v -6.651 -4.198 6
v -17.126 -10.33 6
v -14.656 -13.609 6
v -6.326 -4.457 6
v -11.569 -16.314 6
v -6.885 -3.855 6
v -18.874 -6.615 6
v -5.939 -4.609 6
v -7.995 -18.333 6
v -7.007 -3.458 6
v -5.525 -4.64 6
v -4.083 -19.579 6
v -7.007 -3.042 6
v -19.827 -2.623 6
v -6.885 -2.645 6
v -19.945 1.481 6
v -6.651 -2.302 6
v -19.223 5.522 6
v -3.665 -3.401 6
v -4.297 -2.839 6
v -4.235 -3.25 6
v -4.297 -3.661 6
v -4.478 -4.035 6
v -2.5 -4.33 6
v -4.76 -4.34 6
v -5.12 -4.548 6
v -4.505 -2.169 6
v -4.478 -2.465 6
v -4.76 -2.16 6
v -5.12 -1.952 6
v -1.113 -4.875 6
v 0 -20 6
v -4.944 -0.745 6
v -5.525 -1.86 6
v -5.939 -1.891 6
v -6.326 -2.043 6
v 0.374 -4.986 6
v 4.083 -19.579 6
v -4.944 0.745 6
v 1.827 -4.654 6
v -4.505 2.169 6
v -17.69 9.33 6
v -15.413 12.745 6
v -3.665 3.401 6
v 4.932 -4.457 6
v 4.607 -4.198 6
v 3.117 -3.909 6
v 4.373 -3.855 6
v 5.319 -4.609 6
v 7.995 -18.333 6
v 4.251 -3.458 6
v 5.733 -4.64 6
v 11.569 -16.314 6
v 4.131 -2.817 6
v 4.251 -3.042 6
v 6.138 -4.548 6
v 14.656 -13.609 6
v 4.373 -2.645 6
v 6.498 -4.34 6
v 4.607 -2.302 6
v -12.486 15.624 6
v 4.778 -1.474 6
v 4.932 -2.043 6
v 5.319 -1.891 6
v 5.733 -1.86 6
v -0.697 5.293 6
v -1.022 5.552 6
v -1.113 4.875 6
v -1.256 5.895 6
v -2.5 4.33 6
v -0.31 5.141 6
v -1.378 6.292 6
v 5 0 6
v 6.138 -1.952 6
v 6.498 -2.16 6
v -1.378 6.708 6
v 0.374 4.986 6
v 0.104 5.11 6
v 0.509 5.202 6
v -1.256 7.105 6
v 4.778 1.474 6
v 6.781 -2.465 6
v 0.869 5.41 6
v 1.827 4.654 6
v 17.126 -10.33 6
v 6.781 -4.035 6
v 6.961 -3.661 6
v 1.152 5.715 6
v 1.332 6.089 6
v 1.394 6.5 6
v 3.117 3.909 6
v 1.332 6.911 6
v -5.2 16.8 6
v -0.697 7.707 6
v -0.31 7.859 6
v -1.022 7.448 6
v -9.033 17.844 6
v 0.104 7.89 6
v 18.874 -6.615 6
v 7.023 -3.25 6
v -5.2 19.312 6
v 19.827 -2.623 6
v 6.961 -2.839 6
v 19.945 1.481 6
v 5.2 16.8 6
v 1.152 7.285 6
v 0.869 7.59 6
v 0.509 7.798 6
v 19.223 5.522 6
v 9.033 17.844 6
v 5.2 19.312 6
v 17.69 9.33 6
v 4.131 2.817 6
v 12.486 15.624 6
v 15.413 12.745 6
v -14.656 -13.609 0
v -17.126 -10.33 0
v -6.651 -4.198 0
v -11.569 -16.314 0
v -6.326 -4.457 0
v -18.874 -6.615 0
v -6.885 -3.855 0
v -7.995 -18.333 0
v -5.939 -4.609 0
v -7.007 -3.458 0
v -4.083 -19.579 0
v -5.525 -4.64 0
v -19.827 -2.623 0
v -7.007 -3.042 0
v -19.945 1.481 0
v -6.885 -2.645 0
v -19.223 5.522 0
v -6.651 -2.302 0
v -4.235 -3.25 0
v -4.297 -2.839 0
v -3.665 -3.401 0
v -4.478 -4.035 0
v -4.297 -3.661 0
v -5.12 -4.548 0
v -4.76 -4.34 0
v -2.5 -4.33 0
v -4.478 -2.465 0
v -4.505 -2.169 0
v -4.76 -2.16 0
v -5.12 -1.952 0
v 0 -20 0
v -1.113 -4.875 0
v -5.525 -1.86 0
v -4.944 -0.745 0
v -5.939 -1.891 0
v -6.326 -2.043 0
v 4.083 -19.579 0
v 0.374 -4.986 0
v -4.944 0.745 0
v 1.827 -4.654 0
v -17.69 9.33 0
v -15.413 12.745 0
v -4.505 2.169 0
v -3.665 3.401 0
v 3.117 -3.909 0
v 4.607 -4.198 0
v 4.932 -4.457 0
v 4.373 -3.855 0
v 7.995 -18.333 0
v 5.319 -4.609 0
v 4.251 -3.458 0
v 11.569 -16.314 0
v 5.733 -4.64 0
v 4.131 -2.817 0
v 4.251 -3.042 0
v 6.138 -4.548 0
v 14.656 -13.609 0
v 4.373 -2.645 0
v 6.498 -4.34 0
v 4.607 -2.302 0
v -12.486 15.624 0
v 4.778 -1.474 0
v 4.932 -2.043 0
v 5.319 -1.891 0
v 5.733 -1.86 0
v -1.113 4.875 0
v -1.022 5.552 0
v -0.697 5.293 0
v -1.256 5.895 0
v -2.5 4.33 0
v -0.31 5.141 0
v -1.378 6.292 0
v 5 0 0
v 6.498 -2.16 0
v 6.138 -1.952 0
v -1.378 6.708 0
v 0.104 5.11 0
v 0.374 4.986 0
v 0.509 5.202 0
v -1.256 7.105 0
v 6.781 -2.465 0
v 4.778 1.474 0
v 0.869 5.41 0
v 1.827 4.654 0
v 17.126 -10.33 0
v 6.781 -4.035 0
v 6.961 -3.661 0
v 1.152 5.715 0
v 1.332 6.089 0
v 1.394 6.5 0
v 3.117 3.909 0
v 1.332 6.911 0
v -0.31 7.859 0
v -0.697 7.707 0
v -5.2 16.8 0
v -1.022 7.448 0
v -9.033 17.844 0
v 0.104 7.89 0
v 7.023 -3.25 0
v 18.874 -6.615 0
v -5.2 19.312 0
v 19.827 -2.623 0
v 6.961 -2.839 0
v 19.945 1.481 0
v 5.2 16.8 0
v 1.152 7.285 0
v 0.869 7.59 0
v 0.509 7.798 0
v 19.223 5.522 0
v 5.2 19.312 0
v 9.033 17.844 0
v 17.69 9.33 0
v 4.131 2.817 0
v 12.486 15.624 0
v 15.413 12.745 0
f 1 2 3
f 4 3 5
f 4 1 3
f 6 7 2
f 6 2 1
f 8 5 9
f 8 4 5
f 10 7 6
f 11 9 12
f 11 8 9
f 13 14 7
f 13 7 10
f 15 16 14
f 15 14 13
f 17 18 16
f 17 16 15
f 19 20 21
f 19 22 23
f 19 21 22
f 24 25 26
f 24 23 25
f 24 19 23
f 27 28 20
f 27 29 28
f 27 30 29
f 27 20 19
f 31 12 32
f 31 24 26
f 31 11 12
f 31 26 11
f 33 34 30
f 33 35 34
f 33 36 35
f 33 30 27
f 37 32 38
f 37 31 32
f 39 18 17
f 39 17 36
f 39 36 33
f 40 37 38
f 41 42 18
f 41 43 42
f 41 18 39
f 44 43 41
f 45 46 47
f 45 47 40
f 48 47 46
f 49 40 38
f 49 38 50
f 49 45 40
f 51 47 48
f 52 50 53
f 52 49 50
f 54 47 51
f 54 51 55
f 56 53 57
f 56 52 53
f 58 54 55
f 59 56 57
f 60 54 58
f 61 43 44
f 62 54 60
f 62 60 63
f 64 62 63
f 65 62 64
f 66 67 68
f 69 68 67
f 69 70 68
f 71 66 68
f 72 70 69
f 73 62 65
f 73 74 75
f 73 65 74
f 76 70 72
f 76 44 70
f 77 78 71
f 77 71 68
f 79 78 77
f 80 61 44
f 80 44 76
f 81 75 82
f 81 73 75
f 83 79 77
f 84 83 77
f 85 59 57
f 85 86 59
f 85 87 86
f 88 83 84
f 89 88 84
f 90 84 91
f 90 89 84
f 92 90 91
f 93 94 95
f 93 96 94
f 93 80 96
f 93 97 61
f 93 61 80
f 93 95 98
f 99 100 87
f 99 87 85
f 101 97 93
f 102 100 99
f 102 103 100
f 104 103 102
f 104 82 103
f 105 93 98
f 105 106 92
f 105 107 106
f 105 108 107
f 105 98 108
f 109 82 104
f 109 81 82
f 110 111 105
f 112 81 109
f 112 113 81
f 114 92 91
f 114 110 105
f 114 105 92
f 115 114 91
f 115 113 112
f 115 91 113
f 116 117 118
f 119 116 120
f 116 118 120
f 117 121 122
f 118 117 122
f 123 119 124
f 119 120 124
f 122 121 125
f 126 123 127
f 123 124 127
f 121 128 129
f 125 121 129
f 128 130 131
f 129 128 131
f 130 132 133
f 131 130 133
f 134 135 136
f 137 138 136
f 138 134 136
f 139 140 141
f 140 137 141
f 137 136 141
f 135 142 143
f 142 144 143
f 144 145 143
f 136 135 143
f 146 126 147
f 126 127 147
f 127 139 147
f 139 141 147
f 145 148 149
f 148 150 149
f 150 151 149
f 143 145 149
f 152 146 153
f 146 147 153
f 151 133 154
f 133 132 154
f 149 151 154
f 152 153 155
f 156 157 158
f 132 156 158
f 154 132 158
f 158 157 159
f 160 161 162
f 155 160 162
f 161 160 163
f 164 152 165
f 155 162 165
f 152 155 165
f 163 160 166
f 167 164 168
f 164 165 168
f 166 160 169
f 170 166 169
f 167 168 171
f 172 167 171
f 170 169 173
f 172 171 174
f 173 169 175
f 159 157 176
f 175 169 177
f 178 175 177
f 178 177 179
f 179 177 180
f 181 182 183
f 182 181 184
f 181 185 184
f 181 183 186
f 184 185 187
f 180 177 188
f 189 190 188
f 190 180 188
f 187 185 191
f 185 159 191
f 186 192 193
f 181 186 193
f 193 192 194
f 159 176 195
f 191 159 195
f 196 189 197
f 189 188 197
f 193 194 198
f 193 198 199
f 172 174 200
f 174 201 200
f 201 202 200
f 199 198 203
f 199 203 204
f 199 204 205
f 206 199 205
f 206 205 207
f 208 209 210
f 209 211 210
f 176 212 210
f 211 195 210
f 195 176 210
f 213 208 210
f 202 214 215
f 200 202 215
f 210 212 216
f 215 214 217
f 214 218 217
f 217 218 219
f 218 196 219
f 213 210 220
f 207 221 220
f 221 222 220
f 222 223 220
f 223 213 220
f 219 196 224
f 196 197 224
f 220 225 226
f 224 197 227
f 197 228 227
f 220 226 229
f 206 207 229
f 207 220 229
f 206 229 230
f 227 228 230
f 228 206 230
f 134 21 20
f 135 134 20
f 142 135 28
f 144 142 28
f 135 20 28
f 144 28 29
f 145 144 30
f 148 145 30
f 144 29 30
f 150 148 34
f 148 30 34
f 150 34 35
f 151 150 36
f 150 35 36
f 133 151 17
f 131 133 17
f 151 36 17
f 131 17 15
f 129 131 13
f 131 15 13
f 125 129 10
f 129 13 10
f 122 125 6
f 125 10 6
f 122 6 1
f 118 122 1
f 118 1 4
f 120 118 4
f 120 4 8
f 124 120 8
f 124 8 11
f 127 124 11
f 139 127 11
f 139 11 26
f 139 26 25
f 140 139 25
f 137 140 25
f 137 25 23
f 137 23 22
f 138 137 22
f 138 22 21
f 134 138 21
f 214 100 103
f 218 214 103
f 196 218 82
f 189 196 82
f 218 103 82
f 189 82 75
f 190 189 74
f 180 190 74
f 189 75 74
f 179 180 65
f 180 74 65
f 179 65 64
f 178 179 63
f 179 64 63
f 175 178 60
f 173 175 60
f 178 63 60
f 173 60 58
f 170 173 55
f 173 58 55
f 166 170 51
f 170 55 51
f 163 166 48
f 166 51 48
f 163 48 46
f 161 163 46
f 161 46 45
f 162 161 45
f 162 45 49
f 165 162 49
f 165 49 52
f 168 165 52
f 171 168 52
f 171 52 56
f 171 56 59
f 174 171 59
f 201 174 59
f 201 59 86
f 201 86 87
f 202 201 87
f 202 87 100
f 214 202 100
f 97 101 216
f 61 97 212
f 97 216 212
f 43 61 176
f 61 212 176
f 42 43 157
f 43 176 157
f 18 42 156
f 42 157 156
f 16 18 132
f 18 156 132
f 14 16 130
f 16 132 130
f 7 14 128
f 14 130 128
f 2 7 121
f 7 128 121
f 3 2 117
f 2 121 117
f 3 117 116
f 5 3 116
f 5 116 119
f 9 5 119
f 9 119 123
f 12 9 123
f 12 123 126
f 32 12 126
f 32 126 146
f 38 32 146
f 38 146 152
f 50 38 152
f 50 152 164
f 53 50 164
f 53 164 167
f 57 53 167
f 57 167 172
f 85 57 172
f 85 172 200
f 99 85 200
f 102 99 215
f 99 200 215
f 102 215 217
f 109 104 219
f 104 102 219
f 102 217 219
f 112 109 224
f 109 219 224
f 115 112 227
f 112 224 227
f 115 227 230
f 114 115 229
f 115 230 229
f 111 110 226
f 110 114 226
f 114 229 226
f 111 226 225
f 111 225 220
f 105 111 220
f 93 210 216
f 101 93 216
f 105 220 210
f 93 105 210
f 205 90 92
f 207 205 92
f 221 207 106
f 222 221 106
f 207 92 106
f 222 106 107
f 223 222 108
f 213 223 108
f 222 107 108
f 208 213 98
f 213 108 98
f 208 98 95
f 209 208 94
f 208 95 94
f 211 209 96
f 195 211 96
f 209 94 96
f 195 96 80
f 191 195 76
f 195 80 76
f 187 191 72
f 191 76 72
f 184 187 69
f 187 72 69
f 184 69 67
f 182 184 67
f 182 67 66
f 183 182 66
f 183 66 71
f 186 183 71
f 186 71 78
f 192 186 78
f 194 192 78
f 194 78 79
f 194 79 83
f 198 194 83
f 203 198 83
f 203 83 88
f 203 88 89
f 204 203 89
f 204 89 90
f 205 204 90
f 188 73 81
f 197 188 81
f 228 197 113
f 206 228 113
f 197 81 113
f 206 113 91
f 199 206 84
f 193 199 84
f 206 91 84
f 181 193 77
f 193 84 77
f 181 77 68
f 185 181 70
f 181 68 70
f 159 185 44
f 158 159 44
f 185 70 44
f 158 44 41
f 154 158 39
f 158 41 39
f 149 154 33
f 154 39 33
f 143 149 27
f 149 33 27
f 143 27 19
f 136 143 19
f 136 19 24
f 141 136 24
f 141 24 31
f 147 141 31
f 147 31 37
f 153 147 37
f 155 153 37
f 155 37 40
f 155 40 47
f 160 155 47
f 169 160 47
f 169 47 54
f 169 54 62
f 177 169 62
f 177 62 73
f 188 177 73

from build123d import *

# Parameters (mm, degrees)
ESQUISSE1_R             = 20
BOSS_EXTRU_1_DEPTH      = 6
ESQUISSE2_R             = 5
ENL_V_MAT_EXTRU_1_DEPTH = 29.91366459
ESQUISSE3_R             = 1.393852397
ENL_V_MAT_EXTRU_2_DEPTH = 29.91366459
ENL_V_MAT_EXTRU_3_DEPTH = 29.91366459


with BuildPart() as part:
    # Esquisse1 → Boss.-Extru.1 (new body)
    with BuildSketch(Plane.XY):
        Circle(ESQUISSE1_R)
    extrude(amount=BOSS_EXTRU_1_DEPTH)

    # Esquisse2 → Enlèv. mat.-Extru.1 (cut, through all)
    with BuildSketch(Plane.XY.offset(6)):
        Circle(ESQUISSE2_R)
    extrude(amount=-ENL_V_MAT_EXTRU_1_DEPTH, mode=Mode.SUBTRACT)

    # Esquisse3 → Enlèv. mat.-Extru.2 (cut, through all)
    with BuildSketch(Plane.XY.offset(6)):
        with Locations((0, 6.5)):
            Circle(ESQUISSE3_R)
        with Locations((5.629165125, -3.25)):
            Circle(ESQUISSE3_R)
        with Locations((-5.629165125, -3.25)):
            Circle(ESQUISSE3_R)
    extrude(amount=-ENL_V_MAT_EXTRU_2_DEPTH, mode=Mode.SUBTRACT)

    # Esquisse4 → Enlèv. mat.-Extru.3 (cut, through all)
    with BuildSketch(Plane(origin=(0, 0, 0), x_dir=(-1, 0, 0), z_dir=(0, 0, -1))):
        with BuildLine():
            Line((5.2, 16.80000003), (5.2, 19.312172327))
            ThreePointArc((5.2, 19.312172327), (0, 20), (-5.2, 19.312172327))
            Line((-5.2, 19.312172327), (-5.2, 16.80000003))
            Line((-5.2, 16.80000003), (5.2, 16.80000003))
        make_face()
    extrude(amount=-ENL_V_MAT_EXTRU_3_DEPTH, mode=Mode.SUBTRACT)


solid = part.part
